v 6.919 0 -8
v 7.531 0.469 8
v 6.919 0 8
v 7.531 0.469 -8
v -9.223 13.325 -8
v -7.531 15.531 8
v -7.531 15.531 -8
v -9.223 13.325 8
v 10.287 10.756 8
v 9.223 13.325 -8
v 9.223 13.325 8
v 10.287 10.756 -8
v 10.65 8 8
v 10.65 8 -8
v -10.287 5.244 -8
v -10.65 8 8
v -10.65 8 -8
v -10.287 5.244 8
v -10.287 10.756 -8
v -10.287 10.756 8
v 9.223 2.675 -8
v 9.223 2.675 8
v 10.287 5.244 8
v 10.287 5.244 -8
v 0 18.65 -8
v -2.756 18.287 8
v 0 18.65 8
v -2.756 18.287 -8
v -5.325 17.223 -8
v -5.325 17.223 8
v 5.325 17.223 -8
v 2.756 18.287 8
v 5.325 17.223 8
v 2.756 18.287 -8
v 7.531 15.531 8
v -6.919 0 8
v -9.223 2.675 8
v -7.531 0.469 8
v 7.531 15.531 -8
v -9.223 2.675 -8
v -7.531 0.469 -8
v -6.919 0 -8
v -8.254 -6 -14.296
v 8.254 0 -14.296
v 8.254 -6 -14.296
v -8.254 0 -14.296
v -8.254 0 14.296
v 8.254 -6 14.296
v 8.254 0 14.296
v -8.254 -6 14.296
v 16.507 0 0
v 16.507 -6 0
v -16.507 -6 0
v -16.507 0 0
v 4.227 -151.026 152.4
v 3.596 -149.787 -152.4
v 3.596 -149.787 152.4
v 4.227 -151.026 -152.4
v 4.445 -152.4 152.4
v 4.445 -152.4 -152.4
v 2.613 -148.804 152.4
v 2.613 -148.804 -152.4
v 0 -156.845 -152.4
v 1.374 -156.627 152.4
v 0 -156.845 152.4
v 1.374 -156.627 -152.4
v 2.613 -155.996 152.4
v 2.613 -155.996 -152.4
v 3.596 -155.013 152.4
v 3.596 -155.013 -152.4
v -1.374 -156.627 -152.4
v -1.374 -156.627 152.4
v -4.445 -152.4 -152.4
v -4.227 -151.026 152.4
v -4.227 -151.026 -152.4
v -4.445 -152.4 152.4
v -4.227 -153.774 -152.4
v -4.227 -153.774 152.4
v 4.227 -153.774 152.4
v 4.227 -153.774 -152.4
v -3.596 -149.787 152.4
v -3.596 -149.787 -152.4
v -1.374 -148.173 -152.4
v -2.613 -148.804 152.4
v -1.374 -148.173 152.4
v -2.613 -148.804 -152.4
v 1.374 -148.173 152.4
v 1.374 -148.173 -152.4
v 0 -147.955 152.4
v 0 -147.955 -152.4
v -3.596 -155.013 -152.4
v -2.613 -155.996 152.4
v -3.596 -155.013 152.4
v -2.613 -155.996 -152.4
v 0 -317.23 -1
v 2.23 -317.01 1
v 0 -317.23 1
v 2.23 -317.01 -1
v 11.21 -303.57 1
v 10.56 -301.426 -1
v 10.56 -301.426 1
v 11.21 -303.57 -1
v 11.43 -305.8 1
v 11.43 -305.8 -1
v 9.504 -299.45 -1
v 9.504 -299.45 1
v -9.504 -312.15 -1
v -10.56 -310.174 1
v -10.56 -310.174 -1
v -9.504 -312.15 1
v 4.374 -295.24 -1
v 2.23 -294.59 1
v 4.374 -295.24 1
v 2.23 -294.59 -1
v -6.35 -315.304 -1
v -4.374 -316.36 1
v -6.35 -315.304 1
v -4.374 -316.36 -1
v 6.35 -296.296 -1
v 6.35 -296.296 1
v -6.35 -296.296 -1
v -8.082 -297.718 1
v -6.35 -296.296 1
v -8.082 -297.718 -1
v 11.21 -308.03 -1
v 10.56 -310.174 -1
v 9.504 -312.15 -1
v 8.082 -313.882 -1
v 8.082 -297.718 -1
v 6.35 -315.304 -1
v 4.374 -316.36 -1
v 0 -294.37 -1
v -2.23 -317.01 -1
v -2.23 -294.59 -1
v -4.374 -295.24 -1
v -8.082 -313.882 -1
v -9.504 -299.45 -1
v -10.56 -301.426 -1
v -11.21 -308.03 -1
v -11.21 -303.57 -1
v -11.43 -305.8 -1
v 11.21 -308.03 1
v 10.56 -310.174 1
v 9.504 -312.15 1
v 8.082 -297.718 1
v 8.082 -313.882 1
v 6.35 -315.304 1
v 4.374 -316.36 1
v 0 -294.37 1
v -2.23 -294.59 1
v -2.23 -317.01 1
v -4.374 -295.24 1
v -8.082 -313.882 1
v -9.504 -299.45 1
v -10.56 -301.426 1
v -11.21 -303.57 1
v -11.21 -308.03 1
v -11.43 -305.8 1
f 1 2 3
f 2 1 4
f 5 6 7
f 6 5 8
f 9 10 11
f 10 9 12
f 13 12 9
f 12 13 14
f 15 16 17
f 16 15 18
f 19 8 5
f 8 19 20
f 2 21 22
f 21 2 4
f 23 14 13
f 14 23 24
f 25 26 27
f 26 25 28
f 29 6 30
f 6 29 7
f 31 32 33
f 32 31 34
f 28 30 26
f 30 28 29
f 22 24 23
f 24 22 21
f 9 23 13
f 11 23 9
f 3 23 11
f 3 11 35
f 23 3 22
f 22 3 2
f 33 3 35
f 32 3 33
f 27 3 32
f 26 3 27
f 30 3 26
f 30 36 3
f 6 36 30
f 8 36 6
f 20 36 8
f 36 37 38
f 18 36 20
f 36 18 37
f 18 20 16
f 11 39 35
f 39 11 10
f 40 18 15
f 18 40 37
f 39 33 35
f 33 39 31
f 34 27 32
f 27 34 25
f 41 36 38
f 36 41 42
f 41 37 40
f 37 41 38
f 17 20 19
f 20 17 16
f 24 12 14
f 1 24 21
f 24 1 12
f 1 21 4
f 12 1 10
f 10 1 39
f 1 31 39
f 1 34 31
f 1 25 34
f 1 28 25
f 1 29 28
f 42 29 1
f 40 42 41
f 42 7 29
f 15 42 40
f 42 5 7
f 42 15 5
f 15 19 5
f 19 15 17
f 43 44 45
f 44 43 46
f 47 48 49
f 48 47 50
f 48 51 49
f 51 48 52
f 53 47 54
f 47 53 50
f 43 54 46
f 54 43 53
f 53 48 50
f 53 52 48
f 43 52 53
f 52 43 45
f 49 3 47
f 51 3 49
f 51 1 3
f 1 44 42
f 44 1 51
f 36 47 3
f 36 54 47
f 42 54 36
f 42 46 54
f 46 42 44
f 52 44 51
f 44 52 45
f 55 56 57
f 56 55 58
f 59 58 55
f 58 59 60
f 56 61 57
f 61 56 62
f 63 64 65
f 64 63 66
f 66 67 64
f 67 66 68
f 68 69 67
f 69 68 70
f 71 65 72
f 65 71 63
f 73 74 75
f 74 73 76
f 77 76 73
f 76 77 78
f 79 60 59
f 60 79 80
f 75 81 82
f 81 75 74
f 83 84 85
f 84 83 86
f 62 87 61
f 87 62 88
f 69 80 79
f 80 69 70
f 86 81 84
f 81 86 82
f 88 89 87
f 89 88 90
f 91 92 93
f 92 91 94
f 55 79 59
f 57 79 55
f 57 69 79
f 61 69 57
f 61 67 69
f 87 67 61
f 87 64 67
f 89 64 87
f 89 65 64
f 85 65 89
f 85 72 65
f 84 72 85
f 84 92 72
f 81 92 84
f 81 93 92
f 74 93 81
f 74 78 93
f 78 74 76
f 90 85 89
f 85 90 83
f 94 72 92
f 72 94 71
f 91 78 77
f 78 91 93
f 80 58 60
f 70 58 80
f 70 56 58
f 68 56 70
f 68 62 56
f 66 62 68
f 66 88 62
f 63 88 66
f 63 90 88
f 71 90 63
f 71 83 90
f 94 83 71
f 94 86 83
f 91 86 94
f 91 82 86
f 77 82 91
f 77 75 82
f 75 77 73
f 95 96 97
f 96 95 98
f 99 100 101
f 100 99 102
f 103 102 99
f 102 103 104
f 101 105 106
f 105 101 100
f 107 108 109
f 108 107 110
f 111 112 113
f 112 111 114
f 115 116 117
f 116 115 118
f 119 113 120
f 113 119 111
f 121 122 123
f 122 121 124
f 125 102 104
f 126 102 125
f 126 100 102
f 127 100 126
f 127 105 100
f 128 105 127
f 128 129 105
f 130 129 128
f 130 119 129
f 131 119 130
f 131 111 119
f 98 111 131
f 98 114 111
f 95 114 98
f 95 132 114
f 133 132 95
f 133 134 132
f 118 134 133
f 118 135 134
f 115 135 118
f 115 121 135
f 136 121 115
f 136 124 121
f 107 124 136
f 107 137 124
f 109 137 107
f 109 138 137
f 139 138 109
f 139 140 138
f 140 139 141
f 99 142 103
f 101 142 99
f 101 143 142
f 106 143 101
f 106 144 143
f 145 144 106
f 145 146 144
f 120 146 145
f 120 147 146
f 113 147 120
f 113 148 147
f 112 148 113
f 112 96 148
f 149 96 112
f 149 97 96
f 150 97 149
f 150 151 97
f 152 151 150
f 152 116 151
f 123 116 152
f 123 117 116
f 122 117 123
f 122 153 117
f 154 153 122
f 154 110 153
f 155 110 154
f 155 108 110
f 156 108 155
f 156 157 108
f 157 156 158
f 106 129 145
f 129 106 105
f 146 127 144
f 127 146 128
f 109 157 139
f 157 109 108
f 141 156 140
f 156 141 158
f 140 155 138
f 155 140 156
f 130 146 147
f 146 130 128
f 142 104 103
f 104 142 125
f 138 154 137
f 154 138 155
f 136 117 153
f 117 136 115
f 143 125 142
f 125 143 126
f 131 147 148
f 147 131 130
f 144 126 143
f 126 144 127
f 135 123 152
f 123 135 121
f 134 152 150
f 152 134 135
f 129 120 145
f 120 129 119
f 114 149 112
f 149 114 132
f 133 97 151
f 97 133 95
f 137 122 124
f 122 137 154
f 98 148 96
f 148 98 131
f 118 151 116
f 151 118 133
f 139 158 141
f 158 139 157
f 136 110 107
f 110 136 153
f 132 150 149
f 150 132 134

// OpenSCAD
// Auto-generated by scripts/author_from_manifest.py (Phase D.3).
// Source: data/phase_d_manifest.json (sku_intent='viking-vk597-dry-pendent-155f').
// Do not hand-edit — regenerate from the manifest.
//
// @part viking_vk597_dry_pendent_155f
// @kind sprinkler_head
// @category head.pendant.k56
// @display-name "Viking VK597 Dry Pendent K5.6 155°F"
// @mfg viking_group
// @mfg-pn VK597
// @listing UL FM
// @hazard-classes LH OH1
// @price-usd 79.00
// @install-minutes 14
// @crew journeyman
// @k-factor 5.6
// @orientation pendant
// @response standard
// @temperature 155F
// @param size_in number default=0.5 label="Size" unit="in"
// @port inlet position=[0,0.014,0] direction=[0,1,0] style=NPT_threaded size_in=0.5 role=drop

size_in = 0.5;
k_factor = 5.6;

length_mm   = 304.80;
body_dia_mm = 25.40;
thread_od   = 21.3;
thread_len  = 16;
deflector_d = body_dia_mm * 0.9;

 union() {
    translate([0, thread_len/2, 0])
        cylinder(h = thread_len, d = thread_od, center = true, $fn = 24);
    translate([0, -3, 0])
        rotate([90, 0, 0])
        cylinder(h = 6, d = thread_od * 1.55, $fn = 6, center = true);
    translate([0, -length_mm/2, 0])
        cylinder(h = length_mm, d = body_dia_mm * 0.35, center = true, $fn = 20);
    translate([0, -length_mm - 1, 0])
        cylinder(h = 2, d = deflector_d, center = true, $fn = 32);
}
